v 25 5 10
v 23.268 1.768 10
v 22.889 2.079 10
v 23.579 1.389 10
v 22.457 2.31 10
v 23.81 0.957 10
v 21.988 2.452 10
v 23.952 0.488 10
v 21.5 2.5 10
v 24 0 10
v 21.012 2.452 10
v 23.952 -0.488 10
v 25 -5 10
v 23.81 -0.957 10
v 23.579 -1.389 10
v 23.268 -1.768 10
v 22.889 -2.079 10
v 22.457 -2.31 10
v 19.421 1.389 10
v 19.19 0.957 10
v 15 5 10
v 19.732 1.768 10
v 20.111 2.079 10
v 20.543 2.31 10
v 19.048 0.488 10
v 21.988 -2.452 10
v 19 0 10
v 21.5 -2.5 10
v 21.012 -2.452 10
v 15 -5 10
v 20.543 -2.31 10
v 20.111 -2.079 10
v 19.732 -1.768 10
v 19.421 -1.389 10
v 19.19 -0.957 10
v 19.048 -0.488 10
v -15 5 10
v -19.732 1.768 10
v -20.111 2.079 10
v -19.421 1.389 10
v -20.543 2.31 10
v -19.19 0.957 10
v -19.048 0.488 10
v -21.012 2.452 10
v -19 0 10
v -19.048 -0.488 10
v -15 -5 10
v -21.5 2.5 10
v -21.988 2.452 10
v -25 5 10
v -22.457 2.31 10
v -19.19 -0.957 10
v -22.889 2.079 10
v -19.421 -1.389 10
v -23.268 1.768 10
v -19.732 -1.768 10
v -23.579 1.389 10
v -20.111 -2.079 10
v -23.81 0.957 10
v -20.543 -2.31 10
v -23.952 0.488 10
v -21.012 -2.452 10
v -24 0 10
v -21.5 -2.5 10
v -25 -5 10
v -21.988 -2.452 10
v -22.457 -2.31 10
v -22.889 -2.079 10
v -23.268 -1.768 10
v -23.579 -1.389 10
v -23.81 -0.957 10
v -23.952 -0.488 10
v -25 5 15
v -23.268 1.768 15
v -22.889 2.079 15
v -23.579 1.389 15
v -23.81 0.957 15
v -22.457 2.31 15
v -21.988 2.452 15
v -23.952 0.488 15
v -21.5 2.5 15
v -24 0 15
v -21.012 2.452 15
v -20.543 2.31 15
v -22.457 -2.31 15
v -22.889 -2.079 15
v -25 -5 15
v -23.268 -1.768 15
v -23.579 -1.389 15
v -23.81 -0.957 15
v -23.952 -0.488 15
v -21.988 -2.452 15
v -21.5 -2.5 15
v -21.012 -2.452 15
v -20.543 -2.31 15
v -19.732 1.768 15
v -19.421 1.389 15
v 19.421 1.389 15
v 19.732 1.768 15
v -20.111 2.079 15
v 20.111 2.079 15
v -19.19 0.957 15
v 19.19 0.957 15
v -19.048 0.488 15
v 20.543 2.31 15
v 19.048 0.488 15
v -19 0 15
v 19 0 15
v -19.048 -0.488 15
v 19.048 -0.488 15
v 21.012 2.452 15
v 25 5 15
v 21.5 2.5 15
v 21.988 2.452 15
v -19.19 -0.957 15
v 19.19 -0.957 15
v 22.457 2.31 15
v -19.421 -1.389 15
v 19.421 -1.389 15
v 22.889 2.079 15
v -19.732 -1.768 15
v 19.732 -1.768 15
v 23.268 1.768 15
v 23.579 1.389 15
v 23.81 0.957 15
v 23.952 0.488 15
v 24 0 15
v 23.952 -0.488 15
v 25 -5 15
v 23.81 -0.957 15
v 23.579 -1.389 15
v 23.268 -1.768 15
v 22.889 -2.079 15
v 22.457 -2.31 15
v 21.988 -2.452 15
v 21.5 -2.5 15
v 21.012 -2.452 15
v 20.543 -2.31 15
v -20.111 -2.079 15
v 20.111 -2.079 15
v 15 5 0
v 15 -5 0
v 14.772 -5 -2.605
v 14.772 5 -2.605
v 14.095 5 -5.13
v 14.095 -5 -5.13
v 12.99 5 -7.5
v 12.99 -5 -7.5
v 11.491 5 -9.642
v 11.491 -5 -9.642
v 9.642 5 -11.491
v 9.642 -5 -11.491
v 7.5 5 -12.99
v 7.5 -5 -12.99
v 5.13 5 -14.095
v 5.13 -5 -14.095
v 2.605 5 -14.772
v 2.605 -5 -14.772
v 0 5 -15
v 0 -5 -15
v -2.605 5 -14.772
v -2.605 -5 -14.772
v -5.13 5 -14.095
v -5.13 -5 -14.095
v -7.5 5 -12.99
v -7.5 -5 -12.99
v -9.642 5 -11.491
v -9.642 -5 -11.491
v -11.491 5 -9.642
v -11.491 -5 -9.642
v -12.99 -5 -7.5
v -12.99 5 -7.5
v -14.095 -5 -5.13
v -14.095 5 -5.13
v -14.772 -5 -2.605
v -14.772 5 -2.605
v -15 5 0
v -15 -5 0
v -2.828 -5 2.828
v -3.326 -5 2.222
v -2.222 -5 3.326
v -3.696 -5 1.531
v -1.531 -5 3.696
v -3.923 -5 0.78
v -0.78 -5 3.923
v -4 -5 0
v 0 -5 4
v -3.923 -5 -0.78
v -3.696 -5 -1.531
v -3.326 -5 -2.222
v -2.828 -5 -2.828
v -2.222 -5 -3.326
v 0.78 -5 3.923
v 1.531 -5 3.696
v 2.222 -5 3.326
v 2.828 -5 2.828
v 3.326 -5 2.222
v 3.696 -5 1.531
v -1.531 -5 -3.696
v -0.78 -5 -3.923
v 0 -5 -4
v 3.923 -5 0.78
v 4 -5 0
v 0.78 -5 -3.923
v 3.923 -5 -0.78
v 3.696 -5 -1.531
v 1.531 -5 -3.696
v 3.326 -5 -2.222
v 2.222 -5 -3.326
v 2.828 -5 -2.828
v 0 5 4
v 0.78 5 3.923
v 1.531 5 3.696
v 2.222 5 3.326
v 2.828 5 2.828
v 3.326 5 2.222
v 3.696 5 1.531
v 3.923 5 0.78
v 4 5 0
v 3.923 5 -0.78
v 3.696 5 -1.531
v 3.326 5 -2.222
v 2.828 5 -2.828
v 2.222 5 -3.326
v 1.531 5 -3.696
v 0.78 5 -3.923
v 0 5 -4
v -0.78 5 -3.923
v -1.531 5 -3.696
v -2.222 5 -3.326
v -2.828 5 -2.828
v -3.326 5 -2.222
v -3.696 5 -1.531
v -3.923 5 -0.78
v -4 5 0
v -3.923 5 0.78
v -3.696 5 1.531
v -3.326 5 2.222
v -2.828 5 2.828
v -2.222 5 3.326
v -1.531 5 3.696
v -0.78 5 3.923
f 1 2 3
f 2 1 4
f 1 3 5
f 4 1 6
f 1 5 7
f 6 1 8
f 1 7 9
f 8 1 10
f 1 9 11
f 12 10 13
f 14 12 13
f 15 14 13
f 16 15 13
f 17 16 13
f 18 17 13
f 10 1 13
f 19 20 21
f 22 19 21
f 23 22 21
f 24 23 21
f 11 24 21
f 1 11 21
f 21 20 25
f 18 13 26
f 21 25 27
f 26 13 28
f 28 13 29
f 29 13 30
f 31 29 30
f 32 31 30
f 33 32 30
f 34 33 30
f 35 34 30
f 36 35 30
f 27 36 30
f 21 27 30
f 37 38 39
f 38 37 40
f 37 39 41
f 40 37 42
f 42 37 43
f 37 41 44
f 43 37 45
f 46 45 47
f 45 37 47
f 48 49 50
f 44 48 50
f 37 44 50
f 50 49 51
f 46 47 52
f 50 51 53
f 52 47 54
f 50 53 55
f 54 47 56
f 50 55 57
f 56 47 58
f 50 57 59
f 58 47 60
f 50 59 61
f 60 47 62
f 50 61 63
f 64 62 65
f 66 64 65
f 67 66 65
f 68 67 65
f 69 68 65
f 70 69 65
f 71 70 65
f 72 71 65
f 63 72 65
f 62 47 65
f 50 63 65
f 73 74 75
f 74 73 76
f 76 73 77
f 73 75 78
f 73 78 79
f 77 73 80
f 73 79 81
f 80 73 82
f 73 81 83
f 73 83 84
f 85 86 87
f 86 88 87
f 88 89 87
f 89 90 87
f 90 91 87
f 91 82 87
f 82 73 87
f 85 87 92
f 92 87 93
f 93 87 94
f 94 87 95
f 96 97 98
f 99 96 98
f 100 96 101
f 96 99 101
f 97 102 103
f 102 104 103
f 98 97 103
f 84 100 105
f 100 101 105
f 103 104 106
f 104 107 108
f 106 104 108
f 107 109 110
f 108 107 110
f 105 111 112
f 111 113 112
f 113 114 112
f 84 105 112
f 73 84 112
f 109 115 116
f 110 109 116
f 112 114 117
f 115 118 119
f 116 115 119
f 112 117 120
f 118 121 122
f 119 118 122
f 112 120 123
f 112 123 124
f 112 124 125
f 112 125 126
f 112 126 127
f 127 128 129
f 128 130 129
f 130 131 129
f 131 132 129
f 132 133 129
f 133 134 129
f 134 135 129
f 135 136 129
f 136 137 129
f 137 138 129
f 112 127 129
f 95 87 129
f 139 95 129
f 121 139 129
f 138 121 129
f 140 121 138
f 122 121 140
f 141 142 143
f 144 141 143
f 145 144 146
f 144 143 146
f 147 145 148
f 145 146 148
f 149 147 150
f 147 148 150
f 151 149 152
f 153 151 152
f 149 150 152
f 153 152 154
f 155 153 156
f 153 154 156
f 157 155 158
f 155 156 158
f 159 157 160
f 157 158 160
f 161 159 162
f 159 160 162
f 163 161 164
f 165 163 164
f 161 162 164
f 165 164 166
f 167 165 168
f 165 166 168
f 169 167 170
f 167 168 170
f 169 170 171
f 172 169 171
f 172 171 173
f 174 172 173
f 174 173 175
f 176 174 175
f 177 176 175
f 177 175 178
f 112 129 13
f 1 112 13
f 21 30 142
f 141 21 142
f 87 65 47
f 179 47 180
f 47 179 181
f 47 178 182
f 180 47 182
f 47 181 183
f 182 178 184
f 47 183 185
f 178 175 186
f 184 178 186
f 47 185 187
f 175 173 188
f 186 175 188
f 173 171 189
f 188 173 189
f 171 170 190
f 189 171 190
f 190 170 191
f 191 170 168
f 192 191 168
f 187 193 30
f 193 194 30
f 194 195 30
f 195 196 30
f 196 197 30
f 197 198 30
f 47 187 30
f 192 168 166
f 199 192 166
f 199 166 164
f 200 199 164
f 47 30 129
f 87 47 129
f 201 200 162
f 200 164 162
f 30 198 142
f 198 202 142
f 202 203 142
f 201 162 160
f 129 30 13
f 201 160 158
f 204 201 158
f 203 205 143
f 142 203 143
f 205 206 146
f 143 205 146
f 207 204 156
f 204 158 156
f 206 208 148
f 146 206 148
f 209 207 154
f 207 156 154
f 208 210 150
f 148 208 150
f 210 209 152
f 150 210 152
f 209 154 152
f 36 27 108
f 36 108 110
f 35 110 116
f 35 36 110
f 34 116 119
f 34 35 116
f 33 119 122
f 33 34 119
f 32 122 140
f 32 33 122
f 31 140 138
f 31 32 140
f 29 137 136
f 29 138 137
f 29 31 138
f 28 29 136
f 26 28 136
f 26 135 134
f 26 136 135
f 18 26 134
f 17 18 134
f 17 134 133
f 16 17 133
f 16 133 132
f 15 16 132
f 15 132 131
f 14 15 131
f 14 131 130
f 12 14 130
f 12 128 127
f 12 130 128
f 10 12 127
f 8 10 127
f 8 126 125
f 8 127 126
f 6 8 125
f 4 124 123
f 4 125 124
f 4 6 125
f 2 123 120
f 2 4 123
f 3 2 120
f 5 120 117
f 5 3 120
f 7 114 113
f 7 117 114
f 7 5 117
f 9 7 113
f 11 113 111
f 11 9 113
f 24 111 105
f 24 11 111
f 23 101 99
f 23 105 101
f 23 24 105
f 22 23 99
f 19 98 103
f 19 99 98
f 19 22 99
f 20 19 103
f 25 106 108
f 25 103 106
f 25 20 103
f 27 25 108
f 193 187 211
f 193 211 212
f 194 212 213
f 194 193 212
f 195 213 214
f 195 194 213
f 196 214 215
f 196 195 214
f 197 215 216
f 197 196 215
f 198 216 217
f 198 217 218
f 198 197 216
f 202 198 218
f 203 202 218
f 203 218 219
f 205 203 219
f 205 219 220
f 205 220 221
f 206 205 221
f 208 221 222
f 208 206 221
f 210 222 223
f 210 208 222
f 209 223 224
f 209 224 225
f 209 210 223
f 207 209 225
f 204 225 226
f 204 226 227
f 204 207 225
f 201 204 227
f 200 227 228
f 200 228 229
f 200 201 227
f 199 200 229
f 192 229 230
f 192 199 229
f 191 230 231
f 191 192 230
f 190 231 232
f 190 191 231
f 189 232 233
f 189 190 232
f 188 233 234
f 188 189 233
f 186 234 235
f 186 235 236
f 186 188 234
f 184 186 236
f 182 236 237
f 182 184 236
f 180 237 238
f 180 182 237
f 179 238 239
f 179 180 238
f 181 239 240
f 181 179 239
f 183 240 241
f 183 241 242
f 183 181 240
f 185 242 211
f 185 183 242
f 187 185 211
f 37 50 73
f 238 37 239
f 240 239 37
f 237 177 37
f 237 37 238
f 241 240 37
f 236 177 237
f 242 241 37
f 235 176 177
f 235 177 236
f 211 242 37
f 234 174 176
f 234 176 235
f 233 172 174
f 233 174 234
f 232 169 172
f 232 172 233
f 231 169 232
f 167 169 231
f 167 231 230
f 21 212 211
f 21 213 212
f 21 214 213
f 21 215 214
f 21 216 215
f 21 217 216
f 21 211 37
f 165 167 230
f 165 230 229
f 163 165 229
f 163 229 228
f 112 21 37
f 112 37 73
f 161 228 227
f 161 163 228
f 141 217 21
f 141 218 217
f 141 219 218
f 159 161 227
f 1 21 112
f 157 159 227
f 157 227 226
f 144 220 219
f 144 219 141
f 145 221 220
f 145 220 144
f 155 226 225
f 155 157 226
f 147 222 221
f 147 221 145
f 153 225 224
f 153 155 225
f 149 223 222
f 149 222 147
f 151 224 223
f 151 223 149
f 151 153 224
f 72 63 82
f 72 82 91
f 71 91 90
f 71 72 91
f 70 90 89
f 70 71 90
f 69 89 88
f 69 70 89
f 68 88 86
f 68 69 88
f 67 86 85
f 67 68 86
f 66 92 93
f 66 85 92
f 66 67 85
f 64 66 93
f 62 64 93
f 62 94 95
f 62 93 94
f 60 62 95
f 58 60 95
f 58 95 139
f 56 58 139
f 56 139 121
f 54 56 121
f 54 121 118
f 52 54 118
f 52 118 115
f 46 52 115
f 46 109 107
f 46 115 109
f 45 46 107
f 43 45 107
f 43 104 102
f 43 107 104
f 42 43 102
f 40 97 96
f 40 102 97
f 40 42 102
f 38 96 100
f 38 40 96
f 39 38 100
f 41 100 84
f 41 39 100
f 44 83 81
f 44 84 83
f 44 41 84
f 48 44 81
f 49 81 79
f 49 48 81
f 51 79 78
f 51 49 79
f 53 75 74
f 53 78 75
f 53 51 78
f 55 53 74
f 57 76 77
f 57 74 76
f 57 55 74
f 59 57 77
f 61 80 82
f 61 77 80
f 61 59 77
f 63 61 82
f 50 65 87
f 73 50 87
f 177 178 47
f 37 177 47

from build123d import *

# Parameters (mm, degrees)
RESSALTO_EXTRUS_O1_DEPTH      = 5
RESSALTO_EXTRUS_O1_DEPTH_BACK = 5
CORTE_EXTRUS_O1_DEPTH         = 5
CORTE_EXTRUS_O1_DEPTH_BACK    = 5
ESBO_O2_R                     = 4
ESBO_O3_R                     = 2.5
CORTE_EXTRUS_O2_DEPTH         = 30.580398915


with BuildPart() as part:
    # Esboço1 → Ressalto-extrusão1 (new, two sides: drawn at the far end of the back side and taken through both)
    with BuildSketch(Plane(origin=(0, 0, 0), x_dir=(1, 0, 0), z_dir=(0, 1, 0)).offset(-RESSALTO_EXTRUS_O1_DEPTH_BACK)):
        with BuildLine():
            Line((-15, 0), (-15, -10))
            Line((-15, -10), (-25, -10))
            Line((-25, -10), (-25, -15))
            Line((-25, -15), (25, -15))
            Line((25, -15), (25, -10))
            Line((25, -10), (15, -10))
            Line((15, -10), (15, 0))
            ThreePointArc((15, 0), (0, 15), (-15, 0))
        make_face()
    extrude(amount=RESSALTO_EXTRUS_O1_DEPTH + RESSALTO_EXTRUS_O1_DEPTH_BACK)

    # Esboço2 → Corte-extrusão1 (cut, two sides: drawn at the far end of the back side and taken through both)
    with BuildSketch(Plane(origin=(0, 0, 0), x_dir=(1, 0, 0), z_dir=(0, 1, 0)).offset(-CORTE_EXTRUS_O1_DEPTH_BACK)):
        Circle(ESBO_O2_R)
    extrude(amount=CORTE_EXTRUS_O1_DEPTH + CORTE_EXTRUS_O1_DEPTH_BACK, mode=Mode.SUBTRACT)

    # Esboço3 → Corte-extrusão2 (cut, through all)
    with BuildSketch(Plane.XY):
        with Locations((21.5, 0)):
            Circle(ESBO_O3_R)
        with Locations((-21.5, 0)):
            Circle(ESBO_O3_R)
    extrude(amount=CORTE_EXTRUS_O2_DEPTH, mode=Mode.SUBTRACT)


solid = part.part
